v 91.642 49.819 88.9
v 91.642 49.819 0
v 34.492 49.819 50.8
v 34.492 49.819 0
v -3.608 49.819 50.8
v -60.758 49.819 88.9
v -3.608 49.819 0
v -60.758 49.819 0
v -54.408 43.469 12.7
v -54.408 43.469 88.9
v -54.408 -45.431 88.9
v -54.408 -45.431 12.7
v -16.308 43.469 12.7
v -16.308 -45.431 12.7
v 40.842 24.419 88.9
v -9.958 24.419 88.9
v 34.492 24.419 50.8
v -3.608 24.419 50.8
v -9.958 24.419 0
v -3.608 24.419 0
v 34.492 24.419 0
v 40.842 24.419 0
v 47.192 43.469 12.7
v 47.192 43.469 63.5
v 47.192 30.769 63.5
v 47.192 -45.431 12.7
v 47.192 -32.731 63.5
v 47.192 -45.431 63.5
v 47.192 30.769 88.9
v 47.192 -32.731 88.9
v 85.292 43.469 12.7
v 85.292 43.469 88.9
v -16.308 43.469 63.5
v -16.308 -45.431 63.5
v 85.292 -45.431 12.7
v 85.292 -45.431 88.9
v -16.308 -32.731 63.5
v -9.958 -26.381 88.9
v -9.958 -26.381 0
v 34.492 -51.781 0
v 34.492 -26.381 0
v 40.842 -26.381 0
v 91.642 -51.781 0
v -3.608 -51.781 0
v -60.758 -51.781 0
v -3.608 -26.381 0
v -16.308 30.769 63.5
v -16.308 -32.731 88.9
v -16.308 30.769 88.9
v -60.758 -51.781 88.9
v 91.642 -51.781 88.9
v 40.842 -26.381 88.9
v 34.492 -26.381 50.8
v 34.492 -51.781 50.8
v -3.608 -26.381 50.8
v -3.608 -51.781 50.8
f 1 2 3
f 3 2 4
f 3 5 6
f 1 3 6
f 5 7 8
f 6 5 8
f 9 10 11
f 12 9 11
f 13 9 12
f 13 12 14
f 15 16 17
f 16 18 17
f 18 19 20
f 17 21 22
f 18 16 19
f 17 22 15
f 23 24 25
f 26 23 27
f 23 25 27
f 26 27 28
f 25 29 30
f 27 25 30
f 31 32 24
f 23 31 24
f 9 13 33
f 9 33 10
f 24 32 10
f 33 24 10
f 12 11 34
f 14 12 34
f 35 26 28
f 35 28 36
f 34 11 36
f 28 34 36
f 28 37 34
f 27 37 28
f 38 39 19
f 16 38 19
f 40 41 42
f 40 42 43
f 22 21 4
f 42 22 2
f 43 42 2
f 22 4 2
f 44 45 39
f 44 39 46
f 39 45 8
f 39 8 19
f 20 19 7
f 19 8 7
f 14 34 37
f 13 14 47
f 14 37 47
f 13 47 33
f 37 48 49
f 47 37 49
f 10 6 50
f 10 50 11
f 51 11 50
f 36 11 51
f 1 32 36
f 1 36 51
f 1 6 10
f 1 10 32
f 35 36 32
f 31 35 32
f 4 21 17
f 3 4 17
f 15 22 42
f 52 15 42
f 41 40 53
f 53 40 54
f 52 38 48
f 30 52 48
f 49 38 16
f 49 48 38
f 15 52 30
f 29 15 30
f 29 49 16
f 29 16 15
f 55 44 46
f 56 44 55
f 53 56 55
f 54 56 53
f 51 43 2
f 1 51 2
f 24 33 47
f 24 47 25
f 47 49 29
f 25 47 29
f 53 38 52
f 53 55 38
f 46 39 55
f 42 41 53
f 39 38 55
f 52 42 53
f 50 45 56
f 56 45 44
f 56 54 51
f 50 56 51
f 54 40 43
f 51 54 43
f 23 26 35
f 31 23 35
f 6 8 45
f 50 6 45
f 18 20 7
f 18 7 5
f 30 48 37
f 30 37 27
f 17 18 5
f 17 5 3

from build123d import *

# Parameters (mm, degrees)
F0_W     = 50.8
F0_H     = 25.4
F1_DEPTH = 88.9
F3_DEPTH = 76.2
F2_W     = 63.5
F2_H     = 12.7
F4_DEPTH = 25.4
F5_W     = 38.1
F5_H     = 50.8
F6_DEPTH = 110.744


with BuildPart() as f1:
    # F0 (on Top) → F1 (new body)
    with BuildSketch(Plane.XY):
        Polygon((-60.758203, -51.781196), (-9.958203, -51.781196), (-9.958203, -26.381196), (-9.958203, 24.418804), (-9.958203, 49.818804), (-60.758203, 49.818804), align=None)
        with Locations((15.441797, -39.081196)):
            Rectangle(F0_W, F0_H)
        Polygon((40.841797, -26.381196), (40.841797, -51.781196), (91.641797, -51.781196), (91.641797, 49.818804), (40.841797, 49.818804), (40.841797, 24.418804), align=None)
        with Locations((15.441797, 37.118804)):
            Rectangle(F0_W, F0_H)
    extrude(amount=F1_DEPTH)

    # F2 (on face) → F3 (cut)
    with BuildSketch(Plane.XY.offset(88.9)):
        Polygon((-54.408203, 43.468804), (-54.408203, -45.431196), (-16.308203, -45.431196), (-16.308203, -32.731196), (-16.308203, 30.768804), (-16.308203, 43.468804), align=None)
        Polygon((47.191797, -32.731196), (47.191797, -45.431196), (85.291797, -45.431196), (85.291797, 43.468804), (47.191797, 43.468804), (47.191797, 30.768804), align=None)
    extrude(amount=-F3_DEPTH, mode=Mode.SUBTRACT)

    # F2 (on face) → F4 (cut)
    with BuildSketch(Plane.XY.offset(88.9)):
        with Locations((15.441797, -39.081196)):
            Rectangle(F2_W, F2_H)
        with Locations((15.441797, 37.118804)):
            Rectangle(F2_W, F2_H)
    extrude(amount=-F4_DEPTH, mode=Mode.SUBTRACT)

    # F5 (on face) → F6 (cut)
    with BuildSketch(Plane.XZ.offset(51.781196)):
        with Locations((15.441797, 25.4)):
            Rectangle(F5_W, F5_H)
    extrude(amount=-F6_DEPTH, mode=Mode.SUBTRACT)


solid = f1.part
